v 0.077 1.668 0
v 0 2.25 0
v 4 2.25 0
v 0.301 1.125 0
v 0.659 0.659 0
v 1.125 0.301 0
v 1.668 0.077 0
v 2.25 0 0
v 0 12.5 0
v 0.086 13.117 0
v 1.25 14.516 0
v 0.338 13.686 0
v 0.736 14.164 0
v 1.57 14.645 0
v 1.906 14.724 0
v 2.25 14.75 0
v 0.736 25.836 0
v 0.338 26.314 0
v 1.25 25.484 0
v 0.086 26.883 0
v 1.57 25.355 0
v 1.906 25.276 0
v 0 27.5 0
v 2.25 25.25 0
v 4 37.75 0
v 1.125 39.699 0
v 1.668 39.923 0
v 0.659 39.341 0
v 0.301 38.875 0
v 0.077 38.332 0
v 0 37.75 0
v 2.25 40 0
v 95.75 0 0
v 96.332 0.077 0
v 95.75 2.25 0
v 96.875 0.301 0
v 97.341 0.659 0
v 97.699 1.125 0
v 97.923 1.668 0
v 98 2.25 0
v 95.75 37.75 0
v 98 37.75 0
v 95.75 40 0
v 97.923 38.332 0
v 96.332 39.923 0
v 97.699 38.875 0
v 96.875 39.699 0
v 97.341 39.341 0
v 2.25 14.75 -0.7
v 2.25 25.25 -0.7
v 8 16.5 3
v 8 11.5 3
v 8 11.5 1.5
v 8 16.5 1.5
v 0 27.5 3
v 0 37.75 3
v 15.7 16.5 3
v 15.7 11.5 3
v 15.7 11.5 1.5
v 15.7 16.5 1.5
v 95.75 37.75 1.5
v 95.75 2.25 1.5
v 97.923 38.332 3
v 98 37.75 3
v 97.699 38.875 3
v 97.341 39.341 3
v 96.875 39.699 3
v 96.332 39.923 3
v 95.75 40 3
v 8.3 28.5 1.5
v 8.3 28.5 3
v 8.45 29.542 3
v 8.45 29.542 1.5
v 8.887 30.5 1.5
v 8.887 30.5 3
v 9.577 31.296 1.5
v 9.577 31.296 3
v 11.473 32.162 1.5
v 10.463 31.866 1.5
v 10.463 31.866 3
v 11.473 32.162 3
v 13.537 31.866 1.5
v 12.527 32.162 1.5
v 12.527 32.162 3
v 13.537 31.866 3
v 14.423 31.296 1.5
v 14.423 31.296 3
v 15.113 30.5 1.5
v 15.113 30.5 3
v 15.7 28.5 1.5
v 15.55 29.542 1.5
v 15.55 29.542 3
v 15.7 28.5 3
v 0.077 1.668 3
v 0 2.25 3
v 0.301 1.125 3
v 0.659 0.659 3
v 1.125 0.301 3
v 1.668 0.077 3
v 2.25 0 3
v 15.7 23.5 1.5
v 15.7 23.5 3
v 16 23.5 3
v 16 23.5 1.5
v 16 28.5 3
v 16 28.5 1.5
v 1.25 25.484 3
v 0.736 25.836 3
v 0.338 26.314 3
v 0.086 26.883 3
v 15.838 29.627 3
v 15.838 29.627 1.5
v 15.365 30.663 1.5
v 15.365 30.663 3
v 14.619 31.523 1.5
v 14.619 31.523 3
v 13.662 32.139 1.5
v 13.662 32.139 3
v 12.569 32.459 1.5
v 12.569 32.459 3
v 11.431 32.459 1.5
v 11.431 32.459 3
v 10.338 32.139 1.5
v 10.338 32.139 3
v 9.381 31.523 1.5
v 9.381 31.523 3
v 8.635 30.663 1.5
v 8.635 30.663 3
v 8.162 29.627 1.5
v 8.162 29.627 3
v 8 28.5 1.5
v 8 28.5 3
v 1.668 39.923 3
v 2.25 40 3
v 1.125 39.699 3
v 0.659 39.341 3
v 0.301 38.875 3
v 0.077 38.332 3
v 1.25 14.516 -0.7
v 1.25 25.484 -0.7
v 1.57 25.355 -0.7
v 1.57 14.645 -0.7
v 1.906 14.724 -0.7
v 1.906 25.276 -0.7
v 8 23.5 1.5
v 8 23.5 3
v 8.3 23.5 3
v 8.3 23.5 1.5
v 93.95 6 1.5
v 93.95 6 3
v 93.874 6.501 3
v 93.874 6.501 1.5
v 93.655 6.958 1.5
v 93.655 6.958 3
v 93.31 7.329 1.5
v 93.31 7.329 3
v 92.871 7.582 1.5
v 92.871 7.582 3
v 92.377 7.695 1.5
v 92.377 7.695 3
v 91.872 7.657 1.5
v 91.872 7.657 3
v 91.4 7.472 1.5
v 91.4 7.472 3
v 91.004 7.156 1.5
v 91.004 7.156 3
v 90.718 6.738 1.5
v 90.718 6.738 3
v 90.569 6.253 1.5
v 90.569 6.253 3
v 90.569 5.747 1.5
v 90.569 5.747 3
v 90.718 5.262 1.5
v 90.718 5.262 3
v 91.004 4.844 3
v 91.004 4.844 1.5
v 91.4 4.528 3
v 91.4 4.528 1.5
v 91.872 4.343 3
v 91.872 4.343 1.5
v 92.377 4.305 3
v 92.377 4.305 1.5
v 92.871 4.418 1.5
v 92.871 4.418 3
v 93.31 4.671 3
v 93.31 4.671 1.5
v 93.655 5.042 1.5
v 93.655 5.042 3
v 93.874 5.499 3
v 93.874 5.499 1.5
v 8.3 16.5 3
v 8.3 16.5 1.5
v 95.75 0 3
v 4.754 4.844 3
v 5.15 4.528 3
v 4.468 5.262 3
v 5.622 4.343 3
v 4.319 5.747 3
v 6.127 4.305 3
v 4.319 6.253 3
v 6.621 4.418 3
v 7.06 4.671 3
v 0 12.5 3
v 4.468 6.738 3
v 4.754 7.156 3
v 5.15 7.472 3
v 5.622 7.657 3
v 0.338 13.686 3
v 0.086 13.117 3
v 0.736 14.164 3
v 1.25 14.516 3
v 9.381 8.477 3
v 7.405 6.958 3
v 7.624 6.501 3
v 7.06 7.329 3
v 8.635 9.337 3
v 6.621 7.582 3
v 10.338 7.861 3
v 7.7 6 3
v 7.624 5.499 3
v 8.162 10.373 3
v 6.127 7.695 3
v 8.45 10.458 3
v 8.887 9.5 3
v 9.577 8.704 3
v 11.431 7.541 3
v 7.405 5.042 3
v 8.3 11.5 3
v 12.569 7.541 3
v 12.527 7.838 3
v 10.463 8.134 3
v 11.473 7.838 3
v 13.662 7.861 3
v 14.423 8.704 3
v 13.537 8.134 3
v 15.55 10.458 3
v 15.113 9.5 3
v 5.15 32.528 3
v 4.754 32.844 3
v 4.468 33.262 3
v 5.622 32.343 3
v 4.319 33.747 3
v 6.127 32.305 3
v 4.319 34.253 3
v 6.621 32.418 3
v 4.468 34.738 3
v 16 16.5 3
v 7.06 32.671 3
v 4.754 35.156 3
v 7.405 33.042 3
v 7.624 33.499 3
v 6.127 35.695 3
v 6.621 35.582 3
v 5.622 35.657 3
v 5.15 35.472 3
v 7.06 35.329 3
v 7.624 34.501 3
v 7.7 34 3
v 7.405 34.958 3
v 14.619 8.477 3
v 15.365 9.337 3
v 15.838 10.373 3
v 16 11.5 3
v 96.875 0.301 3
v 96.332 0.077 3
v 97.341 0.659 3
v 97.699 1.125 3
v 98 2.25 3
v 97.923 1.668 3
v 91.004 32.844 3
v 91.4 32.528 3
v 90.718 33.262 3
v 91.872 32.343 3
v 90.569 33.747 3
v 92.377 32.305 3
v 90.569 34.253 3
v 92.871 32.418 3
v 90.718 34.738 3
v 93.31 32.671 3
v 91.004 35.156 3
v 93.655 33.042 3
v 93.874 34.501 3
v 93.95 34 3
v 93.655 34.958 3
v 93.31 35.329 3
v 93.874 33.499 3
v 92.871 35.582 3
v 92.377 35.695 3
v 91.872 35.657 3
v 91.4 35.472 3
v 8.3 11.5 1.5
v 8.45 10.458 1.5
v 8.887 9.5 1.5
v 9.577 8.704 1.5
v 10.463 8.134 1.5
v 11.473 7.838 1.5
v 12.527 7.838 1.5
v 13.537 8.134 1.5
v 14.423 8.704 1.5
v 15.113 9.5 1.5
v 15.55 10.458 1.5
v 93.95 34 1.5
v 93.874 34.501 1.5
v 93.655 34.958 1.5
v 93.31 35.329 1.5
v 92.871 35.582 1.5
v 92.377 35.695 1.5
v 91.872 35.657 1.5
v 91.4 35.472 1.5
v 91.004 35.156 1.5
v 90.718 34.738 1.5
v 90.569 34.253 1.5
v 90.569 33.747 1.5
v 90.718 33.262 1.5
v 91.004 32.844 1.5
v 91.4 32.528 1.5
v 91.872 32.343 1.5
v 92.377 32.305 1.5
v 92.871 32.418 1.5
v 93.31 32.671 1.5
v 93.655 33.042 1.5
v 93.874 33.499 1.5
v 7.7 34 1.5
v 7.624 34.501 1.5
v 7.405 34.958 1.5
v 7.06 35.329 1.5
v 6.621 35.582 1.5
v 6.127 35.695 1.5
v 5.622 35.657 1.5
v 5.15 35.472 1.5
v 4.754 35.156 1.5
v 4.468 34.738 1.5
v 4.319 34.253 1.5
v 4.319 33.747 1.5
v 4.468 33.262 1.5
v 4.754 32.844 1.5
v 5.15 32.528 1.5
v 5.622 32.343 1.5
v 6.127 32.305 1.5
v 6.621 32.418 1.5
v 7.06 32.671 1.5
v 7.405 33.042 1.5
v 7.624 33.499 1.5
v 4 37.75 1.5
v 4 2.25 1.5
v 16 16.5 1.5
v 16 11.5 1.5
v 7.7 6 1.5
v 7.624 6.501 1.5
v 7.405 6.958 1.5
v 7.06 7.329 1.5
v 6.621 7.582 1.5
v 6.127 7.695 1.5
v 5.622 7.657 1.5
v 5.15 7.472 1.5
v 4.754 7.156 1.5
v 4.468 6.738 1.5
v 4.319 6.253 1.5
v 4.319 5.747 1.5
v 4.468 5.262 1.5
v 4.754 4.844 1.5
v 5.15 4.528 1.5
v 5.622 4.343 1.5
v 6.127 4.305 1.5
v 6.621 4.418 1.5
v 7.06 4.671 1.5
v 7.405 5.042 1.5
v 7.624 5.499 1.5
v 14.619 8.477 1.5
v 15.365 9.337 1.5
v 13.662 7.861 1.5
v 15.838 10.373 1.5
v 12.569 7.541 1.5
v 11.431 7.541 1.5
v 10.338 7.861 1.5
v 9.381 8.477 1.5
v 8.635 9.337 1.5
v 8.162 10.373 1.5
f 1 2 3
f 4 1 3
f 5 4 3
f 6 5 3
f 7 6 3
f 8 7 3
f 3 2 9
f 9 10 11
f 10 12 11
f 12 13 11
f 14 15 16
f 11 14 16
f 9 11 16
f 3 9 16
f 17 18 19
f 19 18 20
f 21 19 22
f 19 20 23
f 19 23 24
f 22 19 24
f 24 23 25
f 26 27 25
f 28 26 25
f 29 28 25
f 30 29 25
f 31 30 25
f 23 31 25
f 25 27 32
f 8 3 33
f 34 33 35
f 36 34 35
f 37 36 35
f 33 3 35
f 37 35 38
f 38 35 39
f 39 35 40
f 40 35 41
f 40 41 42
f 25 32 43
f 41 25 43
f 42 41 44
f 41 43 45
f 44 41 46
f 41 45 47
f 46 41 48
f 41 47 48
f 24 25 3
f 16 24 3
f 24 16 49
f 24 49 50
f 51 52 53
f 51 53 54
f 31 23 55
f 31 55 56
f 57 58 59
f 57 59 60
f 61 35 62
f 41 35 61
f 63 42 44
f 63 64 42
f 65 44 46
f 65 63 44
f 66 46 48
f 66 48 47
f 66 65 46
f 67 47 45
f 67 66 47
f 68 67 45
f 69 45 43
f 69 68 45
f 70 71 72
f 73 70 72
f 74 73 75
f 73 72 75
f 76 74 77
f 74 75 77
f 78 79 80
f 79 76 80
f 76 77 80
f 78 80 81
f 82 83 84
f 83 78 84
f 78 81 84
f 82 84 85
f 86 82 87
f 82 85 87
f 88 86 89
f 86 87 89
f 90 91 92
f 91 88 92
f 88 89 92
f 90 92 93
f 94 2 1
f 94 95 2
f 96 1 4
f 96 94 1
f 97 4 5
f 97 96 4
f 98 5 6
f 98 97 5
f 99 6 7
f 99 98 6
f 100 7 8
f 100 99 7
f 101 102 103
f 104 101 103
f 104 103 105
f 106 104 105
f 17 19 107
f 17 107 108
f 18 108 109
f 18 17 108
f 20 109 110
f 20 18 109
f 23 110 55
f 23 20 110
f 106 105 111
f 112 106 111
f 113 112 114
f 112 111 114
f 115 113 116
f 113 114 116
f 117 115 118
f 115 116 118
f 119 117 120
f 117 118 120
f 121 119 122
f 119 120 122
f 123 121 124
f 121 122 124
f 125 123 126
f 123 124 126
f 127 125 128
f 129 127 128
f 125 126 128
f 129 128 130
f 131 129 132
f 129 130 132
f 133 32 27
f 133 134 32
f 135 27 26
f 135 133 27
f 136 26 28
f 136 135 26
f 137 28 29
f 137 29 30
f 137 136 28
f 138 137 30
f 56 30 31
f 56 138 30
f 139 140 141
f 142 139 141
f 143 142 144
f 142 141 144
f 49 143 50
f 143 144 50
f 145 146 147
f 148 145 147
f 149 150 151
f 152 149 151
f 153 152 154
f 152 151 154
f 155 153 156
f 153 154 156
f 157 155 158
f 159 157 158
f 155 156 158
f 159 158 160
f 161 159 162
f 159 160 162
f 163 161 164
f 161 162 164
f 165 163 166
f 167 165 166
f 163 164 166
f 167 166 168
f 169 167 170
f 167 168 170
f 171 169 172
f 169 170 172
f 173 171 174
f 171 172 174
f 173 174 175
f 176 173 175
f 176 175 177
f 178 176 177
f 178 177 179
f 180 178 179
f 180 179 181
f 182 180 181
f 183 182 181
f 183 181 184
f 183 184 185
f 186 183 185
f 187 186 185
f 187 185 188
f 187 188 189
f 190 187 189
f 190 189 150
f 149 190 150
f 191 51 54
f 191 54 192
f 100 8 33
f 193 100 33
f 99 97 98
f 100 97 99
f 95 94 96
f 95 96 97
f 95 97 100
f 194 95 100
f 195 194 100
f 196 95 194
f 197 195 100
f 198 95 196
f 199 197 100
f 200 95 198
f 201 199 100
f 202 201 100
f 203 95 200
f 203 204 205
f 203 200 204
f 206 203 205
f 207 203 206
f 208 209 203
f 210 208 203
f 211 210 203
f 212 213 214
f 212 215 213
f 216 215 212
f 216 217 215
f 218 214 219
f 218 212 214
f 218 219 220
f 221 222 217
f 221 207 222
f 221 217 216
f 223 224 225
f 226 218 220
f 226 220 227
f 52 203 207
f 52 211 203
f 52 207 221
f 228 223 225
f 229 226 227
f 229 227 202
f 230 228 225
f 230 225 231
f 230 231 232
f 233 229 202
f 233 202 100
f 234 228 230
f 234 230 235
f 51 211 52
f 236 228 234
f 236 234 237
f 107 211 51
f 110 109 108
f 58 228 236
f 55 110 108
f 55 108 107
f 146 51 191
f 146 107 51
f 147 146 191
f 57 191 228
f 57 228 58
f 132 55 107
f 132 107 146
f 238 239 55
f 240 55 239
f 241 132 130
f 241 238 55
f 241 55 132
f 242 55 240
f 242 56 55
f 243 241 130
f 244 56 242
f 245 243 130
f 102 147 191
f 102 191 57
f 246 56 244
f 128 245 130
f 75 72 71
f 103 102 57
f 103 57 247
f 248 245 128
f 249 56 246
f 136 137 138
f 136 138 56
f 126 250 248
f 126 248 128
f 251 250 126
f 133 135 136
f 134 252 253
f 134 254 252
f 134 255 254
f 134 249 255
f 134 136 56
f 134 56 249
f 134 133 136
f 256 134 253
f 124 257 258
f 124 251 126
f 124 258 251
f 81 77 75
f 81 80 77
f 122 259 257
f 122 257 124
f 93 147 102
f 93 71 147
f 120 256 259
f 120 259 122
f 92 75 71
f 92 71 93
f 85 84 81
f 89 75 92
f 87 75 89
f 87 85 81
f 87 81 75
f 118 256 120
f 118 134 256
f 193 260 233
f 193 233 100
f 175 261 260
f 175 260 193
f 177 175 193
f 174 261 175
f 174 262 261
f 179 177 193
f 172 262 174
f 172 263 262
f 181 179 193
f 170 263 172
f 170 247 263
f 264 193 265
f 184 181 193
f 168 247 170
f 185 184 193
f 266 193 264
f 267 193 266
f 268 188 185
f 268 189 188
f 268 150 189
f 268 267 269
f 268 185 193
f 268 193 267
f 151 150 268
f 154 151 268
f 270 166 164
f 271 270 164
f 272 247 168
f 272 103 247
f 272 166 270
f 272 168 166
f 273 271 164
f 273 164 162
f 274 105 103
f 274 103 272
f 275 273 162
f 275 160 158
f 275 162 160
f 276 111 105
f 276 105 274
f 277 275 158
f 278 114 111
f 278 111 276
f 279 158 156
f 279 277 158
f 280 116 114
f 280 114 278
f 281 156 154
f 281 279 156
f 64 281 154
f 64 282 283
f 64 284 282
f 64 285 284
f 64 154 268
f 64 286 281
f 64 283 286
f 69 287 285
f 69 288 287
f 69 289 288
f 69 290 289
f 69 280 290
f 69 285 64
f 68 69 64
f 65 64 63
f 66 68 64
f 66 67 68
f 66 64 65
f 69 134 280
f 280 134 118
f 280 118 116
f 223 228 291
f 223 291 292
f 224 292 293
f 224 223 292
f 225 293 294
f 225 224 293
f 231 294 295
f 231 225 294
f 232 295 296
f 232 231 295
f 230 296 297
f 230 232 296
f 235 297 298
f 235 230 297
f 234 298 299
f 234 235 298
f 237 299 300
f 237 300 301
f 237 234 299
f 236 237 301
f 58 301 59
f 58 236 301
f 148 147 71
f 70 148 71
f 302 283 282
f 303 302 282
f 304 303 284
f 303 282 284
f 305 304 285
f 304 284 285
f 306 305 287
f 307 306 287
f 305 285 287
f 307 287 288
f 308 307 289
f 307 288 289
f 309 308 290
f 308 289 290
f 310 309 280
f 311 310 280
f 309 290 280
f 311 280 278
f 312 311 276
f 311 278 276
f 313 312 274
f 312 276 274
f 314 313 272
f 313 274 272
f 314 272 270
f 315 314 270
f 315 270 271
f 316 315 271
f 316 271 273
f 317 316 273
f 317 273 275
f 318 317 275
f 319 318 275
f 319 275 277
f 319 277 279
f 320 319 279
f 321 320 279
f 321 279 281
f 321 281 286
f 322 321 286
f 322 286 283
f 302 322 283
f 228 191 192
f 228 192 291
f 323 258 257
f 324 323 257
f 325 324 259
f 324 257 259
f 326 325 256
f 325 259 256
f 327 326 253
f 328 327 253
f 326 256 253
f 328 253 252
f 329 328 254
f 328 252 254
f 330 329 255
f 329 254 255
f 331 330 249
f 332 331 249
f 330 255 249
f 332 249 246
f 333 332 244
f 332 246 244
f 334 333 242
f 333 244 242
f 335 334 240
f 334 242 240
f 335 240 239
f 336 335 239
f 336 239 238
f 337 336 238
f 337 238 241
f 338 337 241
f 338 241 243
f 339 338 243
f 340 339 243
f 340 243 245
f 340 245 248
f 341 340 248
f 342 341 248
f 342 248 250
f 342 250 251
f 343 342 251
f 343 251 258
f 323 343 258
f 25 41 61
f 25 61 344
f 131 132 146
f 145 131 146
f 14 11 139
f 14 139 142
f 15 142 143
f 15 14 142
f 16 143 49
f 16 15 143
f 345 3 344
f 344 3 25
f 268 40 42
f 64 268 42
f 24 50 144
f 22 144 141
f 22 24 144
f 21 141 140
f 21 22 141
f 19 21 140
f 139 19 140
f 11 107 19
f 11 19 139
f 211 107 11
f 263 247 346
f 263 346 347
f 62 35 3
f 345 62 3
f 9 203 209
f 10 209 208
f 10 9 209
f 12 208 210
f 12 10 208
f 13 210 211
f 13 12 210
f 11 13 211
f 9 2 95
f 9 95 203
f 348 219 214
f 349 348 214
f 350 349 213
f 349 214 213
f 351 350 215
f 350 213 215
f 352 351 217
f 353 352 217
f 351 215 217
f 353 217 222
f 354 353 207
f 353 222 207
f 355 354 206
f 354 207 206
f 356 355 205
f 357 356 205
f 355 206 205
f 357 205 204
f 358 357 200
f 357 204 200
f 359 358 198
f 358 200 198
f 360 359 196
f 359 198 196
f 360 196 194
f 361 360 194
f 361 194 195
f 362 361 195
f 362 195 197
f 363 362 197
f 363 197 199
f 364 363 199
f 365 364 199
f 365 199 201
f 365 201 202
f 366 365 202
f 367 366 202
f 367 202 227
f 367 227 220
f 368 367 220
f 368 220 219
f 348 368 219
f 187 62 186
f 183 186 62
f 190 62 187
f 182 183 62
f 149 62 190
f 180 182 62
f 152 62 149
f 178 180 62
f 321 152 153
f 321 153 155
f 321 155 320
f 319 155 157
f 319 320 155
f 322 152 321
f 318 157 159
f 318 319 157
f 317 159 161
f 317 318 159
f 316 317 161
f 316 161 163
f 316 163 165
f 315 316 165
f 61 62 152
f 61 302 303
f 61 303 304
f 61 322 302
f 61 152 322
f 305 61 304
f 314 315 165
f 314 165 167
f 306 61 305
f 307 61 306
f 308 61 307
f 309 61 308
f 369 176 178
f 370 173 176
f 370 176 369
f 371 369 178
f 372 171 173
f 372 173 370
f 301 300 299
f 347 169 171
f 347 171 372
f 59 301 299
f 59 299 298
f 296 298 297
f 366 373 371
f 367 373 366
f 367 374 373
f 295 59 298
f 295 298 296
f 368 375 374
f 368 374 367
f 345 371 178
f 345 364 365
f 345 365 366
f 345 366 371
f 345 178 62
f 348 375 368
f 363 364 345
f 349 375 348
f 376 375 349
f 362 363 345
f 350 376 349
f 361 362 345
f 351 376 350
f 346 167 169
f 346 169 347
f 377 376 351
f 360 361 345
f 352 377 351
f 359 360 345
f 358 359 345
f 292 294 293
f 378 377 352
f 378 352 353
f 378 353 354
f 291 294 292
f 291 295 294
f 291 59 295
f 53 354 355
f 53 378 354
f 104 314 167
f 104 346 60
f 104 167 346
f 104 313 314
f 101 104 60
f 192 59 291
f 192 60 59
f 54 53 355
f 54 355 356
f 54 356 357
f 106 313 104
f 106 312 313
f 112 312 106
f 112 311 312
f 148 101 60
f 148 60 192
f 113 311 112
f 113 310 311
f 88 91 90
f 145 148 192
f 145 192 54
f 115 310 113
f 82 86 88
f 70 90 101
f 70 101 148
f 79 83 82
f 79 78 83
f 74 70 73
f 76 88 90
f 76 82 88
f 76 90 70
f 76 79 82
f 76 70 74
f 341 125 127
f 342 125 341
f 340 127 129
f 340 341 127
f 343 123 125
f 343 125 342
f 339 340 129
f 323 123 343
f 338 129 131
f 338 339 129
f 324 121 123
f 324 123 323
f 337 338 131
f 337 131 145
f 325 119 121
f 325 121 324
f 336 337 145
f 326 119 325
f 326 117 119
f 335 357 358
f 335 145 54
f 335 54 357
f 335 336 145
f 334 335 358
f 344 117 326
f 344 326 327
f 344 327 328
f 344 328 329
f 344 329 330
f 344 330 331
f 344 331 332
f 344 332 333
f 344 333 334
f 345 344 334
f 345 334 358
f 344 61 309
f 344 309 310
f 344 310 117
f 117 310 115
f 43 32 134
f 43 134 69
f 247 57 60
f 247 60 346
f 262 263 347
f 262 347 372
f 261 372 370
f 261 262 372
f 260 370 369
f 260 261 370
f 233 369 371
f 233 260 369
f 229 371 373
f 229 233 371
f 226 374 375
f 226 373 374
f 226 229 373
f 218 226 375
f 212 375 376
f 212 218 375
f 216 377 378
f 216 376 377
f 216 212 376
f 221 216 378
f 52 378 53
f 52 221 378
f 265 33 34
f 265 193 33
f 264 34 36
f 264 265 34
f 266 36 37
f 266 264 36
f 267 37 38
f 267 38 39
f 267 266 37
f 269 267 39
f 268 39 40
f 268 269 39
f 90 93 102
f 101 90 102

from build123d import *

# Parameters (mm, degrees)
SKETCH1_W           = 98
SKETCH1_H           = 40
BODY_DEPTH          = 3
SKETCH2_W           = 2.25
SKETCH2_H           = 10.5
CUT_EXTRUDE1_DEPTH  = 106.891453857
FILLET2_R           = 2.25
FILLET1_R           = 2.25
BOSS_EXTRUDE4_DEPTH = 3.7
SKETCH7_W           = 91.75
SKETCH7_H           = 35.5
OLED_RECESS_DEPTH   = 1.5
SKETCH9_R           = 1.7
CUT_EXTRUDE5_DEPTH  = 106.913596861


with BuildPart() as part:
    # Sketch1 → body (new body)
    with BuildSketch(Plane.XY):
        with Locations((49, 20)):
            Rectangle(SKETCH1_W, SKETCH1_H)
    extrude(amount=BODY_DEPTH)

    # Sketch2 → Cut-Extrude1 (cut, through all)
    with BuildSketch(Plane.XY.offset(3)):
        with Locations((1.125, 20)):
            Rectangle(SKETCH2_W, SKETCH2_H)
    extrude(amount=-CUT_EXTRUDE1_DEPTH, mode=Mode.SUBTRACT)

    # Fillet2
    fillet2_edges = [part.edges().sort_by_distance(p)[0] for p in [
        (0, 14.75, 1.5),
        (0, 25.25, 1.5),
    ]]
    fillet(fillet2_edges, radius=FILLET2_R - 0.0001)  # a hair under: the kernel refuses the full size

    # Fillet1
    fillet1_edges = [part.edges().sort_by_distance(p)[0] for p in [
        (0, 40, 1.5),
        (98, 40, 1.5),
        (98, 0, 1.5),
        (0, 0, 1.5),
    ]]
    fillet(fillet1_edges, radius=FILLET1_R)

    # Sketch6 → Boss-Extrude4 (add)
    with BuildSketch(Plane.XY.offset(3)):
        with BuildLine():
            Line((1.25, 25.484435563), (1.25, 14.515564437))
            ThreePointArc((1.25, 14.515564437), (1.736443763, 14.69060722), (2.25, 14.75))
            Line((2.25, 14.75), (2.25, 25.25))
            ThreePointArc((2.25, 25.25), (1.736443763, 25.30939278), (1.25, 25.484435563))
        make_face()
    extrude(amount=-BOSS_EXTRUDE4_DEPTH)

    # Sketch7 → oled-recess (cut)
    with BuildSketch(Plane(origin=(0, 0, 0), x_dir=(-1, 0, 0), z_dir=(0, 0, -1))):
        with Locations((-49.875, 20)):
            Rectangle(SKETCH7_W, SKETCH7_H)
    extrude(amount=-OLED_RECESS_DEPTH, mode=Mode.SUBTRACT)

    # Sketch9 → Cut-Extrude5 (cut, through all)
    with BuildSketch(Plane.XY.offset(3)):
        with Locations((6, 34)):
            Circle(SKETCH9_R)
        with Locations((92.25, 34)):
            Circle(SKETCH9_R)
        with Locations((6, 6)):
            Circle(SKETCH9_R)
        with Locations((92.25, 6)):
            Circle(SKETCH9_R)
        with BuildLine():
            Line((8, 28.5), (8, 23.5))
            Line((8, 23.5), (8.3, 23.5))
            Line((8.3, 23.5), (8.3, 28.5))
            ThreePointArc((8.3, 28.5), (12, 32.2), (15.7, 28.5))
            Line((15.7, 28.5), (15.7, 23.5))
            Line((15.7, 23.5), (16, 23.5))
            Line((16, 23.5), (16, 28.5))
            ThreePointArc((16, 28.5), (12, 32.5), (8, 28.5))
        make_face()
        with BuildLine():
            Line((15.7, 16.5), (16, 16.5))
            Line((16, 16.5), (16, 11.5))
            ThreePointArc((16, 11.5), (12, 7.5), (8, 11.5))
            Line((8, 11.5), (8, 16.5))
            Line((8, 16.5), (8.3, 16.5))
            Line((8.3, 16.5), (8.3, 11.5))
            ThreePointArc((8.3, 11.5), (12, 7.8), (15.7, 11.5))
            Line((15.7, 11.5), (15.7, 16.5))
        make_face()
    extrude(amount=-CUT_EXTRUDE5_DEPTH, mode=Mode.SUBTRACT)


solid = part.part
